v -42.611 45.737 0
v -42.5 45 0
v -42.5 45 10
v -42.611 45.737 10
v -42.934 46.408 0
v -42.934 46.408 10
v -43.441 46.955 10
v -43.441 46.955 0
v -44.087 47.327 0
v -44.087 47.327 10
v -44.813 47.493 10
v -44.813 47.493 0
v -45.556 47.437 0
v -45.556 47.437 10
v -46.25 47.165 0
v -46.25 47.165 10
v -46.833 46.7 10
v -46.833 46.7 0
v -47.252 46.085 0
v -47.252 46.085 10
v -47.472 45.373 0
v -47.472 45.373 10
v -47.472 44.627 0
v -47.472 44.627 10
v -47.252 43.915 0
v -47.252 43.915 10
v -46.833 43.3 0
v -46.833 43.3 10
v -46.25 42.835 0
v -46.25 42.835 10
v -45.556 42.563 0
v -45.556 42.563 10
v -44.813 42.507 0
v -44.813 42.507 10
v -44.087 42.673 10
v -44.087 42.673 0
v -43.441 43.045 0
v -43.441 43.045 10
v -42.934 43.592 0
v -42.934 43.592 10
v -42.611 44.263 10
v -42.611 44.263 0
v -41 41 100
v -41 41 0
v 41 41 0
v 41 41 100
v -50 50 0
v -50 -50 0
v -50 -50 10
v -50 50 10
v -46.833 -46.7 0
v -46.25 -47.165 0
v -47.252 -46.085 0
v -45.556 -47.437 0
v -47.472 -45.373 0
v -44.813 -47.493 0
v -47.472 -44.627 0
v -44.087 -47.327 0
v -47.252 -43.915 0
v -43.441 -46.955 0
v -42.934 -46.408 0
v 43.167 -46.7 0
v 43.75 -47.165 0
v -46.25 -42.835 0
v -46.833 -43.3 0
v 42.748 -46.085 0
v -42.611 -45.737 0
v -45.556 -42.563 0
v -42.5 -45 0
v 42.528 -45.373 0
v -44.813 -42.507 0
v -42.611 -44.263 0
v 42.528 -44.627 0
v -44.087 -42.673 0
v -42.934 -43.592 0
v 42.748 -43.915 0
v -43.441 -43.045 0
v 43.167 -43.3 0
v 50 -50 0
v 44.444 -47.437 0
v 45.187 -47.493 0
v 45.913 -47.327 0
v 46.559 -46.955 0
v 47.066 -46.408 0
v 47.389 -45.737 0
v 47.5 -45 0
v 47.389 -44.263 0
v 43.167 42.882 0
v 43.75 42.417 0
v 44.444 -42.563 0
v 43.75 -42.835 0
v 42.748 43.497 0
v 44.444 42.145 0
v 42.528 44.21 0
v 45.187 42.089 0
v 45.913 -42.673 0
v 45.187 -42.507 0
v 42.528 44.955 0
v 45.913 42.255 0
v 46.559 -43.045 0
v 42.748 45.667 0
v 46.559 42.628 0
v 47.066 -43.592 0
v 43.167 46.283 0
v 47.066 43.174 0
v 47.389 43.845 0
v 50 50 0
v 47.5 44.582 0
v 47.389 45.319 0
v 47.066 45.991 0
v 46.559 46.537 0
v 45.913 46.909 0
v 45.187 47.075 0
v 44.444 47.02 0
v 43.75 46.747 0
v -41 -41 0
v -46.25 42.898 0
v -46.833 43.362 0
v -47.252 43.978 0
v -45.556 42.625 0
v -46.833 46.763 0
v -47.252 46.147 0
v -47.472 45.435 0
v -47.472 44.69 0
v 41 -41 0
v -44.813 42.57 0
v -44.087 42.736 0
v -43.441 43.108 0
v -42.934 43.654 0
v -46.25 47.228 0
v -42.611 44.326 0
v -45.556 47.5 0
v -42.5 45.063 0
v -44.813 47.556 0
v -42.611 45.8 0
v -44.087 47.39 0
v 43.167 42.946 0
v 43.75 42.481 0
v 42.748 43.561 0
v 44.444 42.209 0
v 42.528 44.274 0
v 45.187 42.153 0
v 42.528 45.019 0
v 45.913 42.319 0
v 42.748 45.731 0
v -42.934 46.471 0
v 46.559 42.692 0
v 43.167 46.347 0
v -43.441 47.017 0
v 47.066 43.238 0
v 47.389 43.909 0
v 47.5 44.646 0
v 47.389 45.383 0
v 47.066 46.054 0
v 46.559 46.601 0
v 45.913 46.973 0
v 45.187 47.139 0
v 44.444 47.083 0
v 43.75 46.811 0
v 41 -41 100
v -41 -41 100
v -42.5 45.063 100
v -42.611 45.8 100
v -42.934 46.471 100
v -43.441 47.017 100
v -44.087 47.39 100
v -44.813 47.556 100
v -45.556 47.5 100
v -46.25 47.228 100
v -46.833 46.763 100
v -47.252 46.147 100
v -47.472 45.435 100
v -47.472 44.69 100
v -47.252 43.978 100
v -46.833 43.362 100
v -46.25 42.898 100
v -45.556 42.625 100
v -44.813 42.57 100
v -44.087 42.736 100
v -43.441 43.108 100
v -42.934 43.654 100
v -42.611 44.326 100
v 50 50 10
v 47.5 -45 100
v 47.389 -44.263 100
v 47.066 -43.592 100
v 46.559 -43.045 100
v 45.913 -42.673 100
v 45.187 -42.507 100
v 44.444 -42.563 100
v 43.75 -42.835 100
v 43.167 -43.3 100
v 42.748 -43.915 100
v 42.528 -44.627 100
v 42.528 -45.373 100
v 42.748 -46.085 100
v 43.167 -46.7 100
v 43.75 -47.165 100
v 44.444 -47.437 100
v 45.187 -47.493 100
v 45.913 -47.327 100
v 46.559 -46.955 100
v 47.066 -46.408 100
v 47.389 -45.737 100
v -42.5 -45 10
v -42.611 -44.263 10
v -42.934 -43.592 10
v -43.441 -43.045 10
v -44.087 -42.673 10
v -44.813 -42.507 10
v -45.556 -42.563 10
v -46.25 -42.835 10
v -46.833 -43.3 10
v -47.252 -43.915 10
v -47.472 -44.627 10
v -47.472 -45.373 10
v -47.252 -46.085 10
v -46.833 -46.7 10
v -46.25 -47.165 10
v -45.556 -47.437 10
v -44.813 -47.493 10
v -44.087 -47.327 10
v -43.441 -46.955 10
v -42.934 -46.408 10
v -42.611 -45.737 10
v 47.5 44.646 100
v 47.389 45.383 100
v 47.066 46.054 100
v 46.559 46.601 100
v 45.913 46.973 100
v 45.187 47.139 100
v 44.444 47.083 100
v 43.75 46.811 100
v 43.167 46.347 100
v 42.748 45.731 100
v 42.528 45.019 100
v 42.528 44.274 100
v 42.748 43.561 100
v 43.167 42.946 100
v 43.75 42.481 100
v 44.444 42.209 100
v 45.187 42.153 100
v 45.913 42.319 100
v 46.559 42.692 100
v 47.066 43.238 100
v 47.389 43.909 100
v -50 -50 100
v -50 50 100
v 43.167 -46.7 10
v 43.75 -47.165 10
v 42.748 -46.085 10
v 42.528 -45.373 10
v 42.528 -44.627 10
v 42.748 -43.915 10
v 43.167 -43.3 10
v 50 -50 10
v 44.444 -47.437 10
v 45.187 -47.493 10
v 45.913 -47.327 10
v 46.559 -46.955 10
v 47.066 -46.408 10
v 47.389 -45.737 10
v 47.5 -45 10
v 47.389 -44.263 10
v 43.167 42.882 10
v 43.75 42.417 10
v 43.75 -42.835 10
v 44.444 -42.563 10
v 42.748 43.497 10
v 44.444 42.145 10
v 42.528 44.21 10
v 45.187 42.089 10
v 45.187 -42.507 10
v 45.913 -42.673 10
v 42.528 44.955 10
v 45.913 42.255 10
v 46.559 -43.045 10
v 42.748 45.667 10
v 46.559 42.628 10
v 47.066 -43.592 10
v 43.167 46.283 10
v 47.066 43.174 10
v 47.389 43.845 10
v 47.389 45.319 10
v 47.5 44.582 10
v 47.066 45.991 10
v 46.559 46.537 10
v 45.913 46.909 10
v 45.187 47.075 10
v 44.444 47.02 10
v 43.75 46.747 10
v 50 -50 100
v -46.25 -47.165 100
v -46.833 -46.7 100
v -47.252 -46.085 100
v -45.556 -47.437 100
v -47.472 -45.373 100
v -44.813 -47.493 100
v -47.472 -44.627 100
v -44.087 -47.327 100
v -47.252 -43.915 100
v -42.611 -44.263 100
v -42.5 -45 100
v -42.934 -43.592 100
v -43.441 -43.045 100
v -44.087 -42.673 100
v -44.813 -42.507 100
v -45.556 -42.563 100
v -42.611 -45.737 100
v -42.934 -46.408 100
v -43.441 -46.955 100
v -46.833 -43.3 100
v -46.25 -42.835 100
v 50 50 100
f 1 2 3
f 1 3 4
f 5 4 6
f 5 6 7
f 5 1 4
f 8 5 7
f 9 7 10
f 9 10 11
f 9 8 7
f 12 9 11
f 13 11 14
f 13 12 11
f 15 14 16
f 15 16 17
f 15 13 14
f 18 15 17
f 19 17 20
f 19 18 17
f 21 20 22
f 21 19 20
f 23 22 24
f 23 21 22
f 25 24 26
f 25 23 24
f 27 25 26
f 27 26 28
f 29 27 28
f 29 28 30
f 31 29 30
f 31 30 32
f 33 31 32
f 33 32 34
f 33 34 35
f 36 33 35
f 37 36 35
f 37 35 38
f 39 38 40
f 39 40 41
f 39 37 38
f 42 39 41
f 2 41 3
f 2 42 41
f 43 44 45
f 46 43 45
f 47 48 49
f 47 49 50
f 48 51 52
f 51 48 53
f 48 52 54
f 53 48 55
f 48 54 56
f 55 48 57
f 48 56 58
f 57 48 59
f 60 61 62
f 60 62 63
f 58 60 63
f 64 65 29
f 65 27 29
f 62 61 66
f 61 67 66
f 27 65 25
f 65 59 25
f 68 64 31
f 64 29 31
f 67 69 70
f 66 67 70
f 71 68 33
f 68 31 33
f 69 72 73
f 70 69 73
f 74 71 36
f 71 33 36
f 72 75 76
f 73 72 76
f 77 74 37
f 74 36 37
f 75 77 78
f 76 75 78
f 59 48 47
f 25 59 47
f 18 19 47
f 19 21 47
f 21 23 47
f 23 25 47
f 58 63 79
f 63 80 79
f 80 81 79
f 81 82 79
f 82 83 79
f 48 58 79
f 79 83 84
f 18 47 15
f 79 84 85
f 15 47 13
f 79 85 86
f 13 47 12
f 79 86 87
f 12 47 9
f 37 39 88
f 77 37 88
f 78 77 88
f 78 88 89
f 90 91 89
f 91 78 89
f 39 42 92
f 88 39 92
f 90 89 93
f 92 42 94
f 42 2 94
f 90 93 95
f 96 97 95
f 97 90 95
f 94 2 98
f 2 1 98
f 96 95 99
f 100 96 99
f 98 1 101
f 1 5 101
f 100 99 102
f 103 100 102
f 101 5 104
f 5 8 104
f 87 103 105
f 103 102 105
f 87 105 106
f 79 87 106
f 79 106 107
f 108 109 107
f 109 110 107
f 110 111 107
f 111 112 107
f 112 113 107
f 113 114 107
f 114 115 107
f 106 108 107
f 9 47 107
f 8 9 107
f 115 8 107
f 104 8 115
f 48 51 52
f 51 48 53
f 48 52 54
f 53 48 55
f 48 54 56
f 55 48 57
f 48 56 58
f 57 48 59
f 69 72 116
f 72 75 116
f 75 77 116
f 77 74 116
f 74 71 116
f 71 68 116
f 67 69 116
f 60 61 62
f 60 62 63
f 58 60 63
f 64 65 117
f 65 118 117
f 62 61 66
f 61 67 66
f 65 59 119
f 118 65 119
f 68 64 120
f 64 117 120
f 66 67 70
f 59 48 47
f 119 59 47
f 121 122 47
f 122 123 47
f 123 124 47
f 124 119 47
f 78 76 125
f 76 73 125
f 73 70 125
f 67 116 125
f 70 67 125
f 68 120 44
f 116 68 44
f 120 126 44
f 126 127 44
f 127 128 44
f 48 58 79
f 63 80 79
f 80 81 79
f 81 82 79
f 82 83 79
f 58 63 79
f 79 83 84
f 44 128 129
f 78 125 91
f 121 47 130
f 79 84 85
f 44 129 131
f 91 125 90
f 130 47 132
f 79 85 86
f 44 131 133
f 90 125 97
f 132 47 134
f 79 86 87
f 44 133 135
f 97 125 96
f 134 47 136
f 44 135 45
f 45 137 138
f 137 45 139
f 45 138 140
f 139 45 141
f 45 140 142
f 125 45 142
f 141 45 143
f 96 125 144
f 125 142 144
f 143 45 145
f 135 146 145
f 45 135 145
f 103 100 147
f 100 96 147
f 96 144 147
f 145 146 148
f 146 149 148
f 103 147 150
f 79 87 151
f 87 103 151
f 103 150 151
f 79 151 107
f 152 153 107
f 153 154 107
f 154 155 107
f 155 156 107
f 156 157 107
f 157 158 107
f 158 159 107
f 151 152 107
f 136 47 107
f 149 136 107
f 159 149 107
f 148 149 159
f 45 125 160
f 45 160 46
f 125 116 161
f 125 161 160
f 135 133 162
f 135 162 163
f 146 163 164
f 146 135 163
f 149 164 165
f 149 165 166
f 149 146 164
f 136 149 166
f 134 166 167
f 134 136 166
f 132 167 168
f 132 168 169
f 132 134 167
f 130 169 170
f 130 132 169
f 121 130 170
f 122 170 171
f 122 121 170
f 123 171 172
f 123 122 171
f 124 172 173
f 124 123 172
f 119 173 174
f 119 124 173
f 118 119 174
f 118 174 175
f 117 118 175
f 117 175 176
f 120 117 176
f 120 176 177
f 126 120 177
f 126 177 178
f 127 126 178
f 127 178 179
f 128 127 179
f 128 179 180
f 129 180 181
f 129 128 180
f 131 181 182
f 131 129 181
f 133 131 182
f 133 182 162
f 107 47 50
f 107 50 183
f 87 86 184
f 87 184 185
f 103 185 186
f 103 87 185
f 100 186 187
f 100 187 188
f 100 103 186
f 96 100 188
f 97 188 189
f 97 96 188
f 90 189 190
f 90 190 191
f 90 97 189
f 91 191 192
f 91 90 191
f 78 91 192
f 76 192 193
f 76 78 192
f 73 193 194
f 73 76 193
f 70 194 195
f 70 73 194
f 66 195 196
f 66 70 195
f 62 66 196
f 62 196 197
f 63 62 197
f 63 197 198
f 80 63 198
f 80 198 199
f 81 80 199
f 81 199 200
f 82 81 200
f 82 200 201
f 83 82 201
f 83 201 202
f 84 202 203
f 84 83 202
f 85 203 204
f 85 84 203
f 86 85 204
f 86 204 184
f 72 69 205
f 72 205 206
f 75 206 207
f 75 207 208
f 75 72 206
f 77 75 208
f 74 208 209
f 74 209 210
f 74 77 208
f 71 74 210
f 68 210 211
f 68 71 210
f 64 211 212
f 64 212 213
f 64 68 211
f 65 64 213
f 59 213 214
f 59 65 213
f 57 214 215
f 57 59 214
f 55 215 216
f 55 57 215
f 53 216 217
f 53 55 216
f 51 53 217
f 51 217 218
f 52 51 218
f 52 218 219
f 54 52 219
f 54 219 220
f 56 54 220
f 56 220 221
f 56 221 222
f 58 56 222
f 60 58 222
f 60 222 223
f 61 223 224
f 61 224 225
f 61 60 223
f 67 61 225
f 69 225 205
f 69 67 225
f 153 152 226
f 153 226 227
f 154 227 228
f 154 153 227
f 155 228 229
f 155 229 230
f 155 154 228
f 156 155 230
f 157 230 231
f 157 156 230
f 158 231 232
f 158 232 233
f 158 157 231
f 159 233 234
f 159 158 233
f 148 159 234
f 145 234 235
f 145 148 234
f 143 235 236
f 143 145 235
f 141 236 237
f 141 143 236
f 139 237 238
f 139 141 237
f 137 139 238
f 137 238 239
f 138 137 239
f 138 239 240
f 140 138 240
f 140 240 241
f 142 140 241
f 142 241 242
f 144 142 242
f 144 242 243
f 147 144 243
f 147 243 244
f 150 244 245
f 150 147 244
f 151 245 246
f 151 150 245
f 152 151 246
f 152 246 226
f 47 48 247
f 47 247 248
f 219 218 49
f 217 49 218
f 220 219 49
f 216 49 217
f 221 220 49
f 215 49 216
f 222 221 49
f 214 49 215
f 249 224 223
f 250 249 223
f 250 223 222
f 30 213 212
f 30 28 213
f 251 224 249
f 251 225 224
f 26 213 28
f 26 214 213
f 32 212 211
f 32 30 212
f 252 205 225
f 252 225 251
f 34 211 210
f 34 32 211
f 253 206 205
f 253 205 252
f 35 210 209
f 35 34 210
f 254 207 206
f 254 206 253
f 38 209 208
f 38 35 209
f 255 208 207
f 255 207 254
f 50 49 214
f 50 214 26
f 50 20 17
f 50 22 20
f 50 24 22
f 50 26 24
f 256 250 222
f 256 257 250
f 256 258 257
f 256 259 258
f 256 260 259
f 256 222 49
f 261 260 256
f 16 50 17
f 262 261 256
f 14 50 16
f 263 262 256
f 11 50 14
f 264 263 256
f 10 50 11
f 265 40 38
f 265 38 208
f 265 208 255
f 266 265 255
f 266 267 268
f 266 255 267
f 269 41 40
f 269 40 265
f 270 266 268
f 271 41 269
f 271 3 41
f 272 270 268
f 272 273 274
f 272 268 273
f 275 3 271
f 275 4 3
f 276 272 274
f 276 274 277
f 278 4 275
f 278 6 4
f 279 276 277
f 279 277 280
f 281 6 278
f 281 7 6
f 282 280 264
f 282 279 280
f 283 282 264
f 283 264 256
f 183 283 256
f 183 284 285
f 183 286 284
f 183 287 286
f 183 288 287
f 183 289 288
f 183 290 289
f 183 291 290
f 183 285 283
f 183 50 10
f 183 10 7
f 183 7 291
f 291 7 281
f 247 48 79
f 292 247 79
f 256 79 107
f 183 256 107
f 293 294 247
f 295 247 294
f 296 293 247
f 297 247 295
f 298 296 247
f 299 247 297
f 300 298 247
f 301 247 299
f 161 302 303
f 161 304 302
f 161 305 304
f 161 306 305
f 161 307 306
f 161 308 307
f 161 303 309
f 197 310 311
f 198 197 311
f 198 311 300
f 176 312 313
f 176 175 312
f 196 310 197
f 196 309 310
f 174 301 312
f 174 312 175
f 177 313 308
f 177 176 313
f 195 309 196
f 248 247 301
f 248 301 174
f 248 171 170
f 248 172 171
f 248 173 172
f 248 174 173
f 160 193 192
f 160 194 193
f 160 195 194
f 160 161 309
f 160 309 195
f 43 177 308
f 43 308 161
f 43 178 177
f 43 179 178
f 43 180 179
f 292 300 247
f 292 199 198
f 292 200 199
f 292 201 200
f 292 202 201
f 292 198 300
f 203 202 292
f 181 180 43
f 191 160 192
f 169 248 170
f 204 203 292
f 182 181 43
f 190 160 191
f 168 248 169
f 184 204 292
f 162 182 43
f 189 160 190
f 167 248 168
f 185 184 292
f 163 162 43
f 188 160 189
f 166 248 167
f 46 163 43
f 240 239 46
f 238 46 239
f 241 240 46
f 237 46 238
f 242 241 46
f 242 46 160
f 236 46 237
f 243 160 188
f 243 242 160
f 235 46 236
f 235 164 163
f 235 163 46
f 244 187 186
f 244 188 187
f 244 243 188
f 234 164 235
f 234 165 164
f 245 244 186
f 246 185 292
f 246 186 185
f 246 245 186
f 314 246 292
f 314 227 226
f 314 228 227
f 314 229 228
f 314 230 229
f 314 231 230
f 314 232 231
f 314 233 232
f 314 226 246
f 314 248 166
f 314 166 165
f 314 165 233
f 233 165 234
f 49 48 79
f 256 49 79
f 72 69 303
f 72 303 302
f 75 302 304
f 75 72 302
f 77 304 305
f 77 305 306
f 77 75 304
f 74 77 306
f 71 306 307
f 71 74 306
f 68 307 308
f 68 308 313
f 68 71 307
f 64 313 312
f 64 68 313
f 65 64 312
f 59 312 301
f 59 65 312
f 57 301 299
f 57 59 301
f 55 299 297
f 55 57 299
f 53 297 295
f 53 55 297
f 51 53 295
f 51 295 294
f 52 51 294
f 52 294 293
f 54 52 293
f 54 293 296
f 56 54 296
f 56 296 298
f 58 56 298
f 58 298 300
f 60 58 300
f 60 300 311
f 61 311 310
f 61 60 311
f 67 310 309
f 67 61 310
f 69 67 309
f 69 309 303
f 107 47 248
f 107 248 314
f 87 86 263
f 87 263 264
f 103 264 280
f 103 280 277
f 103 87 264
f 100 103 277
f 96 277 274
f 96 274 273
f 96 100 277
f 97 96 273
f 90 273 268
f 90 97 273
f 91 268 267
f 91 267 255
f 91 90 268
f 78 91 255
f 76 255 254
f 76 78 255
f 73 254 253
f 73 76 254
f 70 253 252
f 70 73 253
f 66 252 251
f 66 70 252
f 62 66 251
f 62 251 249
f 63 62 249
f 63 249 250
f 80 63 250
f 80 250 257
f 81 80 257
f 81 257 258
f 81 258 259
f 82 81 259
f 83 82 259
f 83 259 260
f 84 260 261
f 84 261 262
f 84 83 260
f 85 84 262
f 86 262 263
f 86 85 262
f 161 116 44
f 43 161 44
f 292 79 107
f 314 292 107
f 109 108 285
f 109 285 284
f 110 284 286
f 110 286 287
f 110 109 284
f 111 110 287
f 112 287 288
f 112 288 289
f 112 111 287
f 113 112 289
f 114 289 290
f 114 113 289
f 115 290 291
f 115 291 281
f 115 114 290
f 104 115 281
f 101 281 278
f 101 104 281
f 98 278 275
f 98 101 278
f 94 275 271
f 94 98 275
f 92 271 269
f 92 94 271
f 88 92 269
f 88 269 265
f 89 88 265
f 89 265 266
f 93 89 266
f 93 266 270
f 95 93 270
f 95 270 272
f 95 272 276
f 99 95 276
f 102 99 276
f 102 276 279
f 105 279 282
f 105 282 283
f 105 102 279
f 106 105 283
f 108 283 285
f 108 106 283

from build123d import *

# Parameters (mm, degrees)
F0_W     = 100
F0_H     = 100
F0_R     = 2.5
F1_DEPTH = 10
F2_W     = 100
F2_H     = 100
F2_R     = 2.5
F2_W_2   = 82
F2_H_2   = 82
F3_DEPTH = 100


with BuildPart() as f1:
    # F0 (on Top) → F1 (new body)
    with BuildSketch(Plane.XY):
        Rectangle(F0_W, F0_H)
        with Locations((-45, -45)):
            Circle(F0_R, mode=Mode.SUBTRACT)
        with Locations((45, -45)):
            Circle(F0_R, mode=Mode.SUBTRACT)
        with Locations((-45, 45)):
            Circle(F0_R, mode=Mode.SUBTRACT)
        with Locations((45, 44.582203)):
            Circle(F0_R, mode=Mode.SUBTRACT)
    extrude(amount=F1_DEPTH)


with BuildPart() as f3:
    # F2 (on Top) → F3 (new body)
    with BuildSketch(Plane.XY):
        Rectangle(F2_W, F2_H)
        with Locations((-45, -45)):
            Circle(F2_R, mode=Mode.SUBTRACT)
        with Locations((45, -45)):
            Circle(F2_R, mode=Mode.SUBTRACT)
        with Locations((-45, 45.062725)):
            Circle(F2_R, mode=Mode.SUBTRACT)
        Rectangle(F2_W_2, F2_H_2, mode=Mode.SUBTRACT)
        with Locations((45, 44.646144)):
            Circle(F2_R, mode=Mode.SUBTRACT)
    extrude(amount=F3_DEPTH)


solid = Compound([f1.part, f3.part])
